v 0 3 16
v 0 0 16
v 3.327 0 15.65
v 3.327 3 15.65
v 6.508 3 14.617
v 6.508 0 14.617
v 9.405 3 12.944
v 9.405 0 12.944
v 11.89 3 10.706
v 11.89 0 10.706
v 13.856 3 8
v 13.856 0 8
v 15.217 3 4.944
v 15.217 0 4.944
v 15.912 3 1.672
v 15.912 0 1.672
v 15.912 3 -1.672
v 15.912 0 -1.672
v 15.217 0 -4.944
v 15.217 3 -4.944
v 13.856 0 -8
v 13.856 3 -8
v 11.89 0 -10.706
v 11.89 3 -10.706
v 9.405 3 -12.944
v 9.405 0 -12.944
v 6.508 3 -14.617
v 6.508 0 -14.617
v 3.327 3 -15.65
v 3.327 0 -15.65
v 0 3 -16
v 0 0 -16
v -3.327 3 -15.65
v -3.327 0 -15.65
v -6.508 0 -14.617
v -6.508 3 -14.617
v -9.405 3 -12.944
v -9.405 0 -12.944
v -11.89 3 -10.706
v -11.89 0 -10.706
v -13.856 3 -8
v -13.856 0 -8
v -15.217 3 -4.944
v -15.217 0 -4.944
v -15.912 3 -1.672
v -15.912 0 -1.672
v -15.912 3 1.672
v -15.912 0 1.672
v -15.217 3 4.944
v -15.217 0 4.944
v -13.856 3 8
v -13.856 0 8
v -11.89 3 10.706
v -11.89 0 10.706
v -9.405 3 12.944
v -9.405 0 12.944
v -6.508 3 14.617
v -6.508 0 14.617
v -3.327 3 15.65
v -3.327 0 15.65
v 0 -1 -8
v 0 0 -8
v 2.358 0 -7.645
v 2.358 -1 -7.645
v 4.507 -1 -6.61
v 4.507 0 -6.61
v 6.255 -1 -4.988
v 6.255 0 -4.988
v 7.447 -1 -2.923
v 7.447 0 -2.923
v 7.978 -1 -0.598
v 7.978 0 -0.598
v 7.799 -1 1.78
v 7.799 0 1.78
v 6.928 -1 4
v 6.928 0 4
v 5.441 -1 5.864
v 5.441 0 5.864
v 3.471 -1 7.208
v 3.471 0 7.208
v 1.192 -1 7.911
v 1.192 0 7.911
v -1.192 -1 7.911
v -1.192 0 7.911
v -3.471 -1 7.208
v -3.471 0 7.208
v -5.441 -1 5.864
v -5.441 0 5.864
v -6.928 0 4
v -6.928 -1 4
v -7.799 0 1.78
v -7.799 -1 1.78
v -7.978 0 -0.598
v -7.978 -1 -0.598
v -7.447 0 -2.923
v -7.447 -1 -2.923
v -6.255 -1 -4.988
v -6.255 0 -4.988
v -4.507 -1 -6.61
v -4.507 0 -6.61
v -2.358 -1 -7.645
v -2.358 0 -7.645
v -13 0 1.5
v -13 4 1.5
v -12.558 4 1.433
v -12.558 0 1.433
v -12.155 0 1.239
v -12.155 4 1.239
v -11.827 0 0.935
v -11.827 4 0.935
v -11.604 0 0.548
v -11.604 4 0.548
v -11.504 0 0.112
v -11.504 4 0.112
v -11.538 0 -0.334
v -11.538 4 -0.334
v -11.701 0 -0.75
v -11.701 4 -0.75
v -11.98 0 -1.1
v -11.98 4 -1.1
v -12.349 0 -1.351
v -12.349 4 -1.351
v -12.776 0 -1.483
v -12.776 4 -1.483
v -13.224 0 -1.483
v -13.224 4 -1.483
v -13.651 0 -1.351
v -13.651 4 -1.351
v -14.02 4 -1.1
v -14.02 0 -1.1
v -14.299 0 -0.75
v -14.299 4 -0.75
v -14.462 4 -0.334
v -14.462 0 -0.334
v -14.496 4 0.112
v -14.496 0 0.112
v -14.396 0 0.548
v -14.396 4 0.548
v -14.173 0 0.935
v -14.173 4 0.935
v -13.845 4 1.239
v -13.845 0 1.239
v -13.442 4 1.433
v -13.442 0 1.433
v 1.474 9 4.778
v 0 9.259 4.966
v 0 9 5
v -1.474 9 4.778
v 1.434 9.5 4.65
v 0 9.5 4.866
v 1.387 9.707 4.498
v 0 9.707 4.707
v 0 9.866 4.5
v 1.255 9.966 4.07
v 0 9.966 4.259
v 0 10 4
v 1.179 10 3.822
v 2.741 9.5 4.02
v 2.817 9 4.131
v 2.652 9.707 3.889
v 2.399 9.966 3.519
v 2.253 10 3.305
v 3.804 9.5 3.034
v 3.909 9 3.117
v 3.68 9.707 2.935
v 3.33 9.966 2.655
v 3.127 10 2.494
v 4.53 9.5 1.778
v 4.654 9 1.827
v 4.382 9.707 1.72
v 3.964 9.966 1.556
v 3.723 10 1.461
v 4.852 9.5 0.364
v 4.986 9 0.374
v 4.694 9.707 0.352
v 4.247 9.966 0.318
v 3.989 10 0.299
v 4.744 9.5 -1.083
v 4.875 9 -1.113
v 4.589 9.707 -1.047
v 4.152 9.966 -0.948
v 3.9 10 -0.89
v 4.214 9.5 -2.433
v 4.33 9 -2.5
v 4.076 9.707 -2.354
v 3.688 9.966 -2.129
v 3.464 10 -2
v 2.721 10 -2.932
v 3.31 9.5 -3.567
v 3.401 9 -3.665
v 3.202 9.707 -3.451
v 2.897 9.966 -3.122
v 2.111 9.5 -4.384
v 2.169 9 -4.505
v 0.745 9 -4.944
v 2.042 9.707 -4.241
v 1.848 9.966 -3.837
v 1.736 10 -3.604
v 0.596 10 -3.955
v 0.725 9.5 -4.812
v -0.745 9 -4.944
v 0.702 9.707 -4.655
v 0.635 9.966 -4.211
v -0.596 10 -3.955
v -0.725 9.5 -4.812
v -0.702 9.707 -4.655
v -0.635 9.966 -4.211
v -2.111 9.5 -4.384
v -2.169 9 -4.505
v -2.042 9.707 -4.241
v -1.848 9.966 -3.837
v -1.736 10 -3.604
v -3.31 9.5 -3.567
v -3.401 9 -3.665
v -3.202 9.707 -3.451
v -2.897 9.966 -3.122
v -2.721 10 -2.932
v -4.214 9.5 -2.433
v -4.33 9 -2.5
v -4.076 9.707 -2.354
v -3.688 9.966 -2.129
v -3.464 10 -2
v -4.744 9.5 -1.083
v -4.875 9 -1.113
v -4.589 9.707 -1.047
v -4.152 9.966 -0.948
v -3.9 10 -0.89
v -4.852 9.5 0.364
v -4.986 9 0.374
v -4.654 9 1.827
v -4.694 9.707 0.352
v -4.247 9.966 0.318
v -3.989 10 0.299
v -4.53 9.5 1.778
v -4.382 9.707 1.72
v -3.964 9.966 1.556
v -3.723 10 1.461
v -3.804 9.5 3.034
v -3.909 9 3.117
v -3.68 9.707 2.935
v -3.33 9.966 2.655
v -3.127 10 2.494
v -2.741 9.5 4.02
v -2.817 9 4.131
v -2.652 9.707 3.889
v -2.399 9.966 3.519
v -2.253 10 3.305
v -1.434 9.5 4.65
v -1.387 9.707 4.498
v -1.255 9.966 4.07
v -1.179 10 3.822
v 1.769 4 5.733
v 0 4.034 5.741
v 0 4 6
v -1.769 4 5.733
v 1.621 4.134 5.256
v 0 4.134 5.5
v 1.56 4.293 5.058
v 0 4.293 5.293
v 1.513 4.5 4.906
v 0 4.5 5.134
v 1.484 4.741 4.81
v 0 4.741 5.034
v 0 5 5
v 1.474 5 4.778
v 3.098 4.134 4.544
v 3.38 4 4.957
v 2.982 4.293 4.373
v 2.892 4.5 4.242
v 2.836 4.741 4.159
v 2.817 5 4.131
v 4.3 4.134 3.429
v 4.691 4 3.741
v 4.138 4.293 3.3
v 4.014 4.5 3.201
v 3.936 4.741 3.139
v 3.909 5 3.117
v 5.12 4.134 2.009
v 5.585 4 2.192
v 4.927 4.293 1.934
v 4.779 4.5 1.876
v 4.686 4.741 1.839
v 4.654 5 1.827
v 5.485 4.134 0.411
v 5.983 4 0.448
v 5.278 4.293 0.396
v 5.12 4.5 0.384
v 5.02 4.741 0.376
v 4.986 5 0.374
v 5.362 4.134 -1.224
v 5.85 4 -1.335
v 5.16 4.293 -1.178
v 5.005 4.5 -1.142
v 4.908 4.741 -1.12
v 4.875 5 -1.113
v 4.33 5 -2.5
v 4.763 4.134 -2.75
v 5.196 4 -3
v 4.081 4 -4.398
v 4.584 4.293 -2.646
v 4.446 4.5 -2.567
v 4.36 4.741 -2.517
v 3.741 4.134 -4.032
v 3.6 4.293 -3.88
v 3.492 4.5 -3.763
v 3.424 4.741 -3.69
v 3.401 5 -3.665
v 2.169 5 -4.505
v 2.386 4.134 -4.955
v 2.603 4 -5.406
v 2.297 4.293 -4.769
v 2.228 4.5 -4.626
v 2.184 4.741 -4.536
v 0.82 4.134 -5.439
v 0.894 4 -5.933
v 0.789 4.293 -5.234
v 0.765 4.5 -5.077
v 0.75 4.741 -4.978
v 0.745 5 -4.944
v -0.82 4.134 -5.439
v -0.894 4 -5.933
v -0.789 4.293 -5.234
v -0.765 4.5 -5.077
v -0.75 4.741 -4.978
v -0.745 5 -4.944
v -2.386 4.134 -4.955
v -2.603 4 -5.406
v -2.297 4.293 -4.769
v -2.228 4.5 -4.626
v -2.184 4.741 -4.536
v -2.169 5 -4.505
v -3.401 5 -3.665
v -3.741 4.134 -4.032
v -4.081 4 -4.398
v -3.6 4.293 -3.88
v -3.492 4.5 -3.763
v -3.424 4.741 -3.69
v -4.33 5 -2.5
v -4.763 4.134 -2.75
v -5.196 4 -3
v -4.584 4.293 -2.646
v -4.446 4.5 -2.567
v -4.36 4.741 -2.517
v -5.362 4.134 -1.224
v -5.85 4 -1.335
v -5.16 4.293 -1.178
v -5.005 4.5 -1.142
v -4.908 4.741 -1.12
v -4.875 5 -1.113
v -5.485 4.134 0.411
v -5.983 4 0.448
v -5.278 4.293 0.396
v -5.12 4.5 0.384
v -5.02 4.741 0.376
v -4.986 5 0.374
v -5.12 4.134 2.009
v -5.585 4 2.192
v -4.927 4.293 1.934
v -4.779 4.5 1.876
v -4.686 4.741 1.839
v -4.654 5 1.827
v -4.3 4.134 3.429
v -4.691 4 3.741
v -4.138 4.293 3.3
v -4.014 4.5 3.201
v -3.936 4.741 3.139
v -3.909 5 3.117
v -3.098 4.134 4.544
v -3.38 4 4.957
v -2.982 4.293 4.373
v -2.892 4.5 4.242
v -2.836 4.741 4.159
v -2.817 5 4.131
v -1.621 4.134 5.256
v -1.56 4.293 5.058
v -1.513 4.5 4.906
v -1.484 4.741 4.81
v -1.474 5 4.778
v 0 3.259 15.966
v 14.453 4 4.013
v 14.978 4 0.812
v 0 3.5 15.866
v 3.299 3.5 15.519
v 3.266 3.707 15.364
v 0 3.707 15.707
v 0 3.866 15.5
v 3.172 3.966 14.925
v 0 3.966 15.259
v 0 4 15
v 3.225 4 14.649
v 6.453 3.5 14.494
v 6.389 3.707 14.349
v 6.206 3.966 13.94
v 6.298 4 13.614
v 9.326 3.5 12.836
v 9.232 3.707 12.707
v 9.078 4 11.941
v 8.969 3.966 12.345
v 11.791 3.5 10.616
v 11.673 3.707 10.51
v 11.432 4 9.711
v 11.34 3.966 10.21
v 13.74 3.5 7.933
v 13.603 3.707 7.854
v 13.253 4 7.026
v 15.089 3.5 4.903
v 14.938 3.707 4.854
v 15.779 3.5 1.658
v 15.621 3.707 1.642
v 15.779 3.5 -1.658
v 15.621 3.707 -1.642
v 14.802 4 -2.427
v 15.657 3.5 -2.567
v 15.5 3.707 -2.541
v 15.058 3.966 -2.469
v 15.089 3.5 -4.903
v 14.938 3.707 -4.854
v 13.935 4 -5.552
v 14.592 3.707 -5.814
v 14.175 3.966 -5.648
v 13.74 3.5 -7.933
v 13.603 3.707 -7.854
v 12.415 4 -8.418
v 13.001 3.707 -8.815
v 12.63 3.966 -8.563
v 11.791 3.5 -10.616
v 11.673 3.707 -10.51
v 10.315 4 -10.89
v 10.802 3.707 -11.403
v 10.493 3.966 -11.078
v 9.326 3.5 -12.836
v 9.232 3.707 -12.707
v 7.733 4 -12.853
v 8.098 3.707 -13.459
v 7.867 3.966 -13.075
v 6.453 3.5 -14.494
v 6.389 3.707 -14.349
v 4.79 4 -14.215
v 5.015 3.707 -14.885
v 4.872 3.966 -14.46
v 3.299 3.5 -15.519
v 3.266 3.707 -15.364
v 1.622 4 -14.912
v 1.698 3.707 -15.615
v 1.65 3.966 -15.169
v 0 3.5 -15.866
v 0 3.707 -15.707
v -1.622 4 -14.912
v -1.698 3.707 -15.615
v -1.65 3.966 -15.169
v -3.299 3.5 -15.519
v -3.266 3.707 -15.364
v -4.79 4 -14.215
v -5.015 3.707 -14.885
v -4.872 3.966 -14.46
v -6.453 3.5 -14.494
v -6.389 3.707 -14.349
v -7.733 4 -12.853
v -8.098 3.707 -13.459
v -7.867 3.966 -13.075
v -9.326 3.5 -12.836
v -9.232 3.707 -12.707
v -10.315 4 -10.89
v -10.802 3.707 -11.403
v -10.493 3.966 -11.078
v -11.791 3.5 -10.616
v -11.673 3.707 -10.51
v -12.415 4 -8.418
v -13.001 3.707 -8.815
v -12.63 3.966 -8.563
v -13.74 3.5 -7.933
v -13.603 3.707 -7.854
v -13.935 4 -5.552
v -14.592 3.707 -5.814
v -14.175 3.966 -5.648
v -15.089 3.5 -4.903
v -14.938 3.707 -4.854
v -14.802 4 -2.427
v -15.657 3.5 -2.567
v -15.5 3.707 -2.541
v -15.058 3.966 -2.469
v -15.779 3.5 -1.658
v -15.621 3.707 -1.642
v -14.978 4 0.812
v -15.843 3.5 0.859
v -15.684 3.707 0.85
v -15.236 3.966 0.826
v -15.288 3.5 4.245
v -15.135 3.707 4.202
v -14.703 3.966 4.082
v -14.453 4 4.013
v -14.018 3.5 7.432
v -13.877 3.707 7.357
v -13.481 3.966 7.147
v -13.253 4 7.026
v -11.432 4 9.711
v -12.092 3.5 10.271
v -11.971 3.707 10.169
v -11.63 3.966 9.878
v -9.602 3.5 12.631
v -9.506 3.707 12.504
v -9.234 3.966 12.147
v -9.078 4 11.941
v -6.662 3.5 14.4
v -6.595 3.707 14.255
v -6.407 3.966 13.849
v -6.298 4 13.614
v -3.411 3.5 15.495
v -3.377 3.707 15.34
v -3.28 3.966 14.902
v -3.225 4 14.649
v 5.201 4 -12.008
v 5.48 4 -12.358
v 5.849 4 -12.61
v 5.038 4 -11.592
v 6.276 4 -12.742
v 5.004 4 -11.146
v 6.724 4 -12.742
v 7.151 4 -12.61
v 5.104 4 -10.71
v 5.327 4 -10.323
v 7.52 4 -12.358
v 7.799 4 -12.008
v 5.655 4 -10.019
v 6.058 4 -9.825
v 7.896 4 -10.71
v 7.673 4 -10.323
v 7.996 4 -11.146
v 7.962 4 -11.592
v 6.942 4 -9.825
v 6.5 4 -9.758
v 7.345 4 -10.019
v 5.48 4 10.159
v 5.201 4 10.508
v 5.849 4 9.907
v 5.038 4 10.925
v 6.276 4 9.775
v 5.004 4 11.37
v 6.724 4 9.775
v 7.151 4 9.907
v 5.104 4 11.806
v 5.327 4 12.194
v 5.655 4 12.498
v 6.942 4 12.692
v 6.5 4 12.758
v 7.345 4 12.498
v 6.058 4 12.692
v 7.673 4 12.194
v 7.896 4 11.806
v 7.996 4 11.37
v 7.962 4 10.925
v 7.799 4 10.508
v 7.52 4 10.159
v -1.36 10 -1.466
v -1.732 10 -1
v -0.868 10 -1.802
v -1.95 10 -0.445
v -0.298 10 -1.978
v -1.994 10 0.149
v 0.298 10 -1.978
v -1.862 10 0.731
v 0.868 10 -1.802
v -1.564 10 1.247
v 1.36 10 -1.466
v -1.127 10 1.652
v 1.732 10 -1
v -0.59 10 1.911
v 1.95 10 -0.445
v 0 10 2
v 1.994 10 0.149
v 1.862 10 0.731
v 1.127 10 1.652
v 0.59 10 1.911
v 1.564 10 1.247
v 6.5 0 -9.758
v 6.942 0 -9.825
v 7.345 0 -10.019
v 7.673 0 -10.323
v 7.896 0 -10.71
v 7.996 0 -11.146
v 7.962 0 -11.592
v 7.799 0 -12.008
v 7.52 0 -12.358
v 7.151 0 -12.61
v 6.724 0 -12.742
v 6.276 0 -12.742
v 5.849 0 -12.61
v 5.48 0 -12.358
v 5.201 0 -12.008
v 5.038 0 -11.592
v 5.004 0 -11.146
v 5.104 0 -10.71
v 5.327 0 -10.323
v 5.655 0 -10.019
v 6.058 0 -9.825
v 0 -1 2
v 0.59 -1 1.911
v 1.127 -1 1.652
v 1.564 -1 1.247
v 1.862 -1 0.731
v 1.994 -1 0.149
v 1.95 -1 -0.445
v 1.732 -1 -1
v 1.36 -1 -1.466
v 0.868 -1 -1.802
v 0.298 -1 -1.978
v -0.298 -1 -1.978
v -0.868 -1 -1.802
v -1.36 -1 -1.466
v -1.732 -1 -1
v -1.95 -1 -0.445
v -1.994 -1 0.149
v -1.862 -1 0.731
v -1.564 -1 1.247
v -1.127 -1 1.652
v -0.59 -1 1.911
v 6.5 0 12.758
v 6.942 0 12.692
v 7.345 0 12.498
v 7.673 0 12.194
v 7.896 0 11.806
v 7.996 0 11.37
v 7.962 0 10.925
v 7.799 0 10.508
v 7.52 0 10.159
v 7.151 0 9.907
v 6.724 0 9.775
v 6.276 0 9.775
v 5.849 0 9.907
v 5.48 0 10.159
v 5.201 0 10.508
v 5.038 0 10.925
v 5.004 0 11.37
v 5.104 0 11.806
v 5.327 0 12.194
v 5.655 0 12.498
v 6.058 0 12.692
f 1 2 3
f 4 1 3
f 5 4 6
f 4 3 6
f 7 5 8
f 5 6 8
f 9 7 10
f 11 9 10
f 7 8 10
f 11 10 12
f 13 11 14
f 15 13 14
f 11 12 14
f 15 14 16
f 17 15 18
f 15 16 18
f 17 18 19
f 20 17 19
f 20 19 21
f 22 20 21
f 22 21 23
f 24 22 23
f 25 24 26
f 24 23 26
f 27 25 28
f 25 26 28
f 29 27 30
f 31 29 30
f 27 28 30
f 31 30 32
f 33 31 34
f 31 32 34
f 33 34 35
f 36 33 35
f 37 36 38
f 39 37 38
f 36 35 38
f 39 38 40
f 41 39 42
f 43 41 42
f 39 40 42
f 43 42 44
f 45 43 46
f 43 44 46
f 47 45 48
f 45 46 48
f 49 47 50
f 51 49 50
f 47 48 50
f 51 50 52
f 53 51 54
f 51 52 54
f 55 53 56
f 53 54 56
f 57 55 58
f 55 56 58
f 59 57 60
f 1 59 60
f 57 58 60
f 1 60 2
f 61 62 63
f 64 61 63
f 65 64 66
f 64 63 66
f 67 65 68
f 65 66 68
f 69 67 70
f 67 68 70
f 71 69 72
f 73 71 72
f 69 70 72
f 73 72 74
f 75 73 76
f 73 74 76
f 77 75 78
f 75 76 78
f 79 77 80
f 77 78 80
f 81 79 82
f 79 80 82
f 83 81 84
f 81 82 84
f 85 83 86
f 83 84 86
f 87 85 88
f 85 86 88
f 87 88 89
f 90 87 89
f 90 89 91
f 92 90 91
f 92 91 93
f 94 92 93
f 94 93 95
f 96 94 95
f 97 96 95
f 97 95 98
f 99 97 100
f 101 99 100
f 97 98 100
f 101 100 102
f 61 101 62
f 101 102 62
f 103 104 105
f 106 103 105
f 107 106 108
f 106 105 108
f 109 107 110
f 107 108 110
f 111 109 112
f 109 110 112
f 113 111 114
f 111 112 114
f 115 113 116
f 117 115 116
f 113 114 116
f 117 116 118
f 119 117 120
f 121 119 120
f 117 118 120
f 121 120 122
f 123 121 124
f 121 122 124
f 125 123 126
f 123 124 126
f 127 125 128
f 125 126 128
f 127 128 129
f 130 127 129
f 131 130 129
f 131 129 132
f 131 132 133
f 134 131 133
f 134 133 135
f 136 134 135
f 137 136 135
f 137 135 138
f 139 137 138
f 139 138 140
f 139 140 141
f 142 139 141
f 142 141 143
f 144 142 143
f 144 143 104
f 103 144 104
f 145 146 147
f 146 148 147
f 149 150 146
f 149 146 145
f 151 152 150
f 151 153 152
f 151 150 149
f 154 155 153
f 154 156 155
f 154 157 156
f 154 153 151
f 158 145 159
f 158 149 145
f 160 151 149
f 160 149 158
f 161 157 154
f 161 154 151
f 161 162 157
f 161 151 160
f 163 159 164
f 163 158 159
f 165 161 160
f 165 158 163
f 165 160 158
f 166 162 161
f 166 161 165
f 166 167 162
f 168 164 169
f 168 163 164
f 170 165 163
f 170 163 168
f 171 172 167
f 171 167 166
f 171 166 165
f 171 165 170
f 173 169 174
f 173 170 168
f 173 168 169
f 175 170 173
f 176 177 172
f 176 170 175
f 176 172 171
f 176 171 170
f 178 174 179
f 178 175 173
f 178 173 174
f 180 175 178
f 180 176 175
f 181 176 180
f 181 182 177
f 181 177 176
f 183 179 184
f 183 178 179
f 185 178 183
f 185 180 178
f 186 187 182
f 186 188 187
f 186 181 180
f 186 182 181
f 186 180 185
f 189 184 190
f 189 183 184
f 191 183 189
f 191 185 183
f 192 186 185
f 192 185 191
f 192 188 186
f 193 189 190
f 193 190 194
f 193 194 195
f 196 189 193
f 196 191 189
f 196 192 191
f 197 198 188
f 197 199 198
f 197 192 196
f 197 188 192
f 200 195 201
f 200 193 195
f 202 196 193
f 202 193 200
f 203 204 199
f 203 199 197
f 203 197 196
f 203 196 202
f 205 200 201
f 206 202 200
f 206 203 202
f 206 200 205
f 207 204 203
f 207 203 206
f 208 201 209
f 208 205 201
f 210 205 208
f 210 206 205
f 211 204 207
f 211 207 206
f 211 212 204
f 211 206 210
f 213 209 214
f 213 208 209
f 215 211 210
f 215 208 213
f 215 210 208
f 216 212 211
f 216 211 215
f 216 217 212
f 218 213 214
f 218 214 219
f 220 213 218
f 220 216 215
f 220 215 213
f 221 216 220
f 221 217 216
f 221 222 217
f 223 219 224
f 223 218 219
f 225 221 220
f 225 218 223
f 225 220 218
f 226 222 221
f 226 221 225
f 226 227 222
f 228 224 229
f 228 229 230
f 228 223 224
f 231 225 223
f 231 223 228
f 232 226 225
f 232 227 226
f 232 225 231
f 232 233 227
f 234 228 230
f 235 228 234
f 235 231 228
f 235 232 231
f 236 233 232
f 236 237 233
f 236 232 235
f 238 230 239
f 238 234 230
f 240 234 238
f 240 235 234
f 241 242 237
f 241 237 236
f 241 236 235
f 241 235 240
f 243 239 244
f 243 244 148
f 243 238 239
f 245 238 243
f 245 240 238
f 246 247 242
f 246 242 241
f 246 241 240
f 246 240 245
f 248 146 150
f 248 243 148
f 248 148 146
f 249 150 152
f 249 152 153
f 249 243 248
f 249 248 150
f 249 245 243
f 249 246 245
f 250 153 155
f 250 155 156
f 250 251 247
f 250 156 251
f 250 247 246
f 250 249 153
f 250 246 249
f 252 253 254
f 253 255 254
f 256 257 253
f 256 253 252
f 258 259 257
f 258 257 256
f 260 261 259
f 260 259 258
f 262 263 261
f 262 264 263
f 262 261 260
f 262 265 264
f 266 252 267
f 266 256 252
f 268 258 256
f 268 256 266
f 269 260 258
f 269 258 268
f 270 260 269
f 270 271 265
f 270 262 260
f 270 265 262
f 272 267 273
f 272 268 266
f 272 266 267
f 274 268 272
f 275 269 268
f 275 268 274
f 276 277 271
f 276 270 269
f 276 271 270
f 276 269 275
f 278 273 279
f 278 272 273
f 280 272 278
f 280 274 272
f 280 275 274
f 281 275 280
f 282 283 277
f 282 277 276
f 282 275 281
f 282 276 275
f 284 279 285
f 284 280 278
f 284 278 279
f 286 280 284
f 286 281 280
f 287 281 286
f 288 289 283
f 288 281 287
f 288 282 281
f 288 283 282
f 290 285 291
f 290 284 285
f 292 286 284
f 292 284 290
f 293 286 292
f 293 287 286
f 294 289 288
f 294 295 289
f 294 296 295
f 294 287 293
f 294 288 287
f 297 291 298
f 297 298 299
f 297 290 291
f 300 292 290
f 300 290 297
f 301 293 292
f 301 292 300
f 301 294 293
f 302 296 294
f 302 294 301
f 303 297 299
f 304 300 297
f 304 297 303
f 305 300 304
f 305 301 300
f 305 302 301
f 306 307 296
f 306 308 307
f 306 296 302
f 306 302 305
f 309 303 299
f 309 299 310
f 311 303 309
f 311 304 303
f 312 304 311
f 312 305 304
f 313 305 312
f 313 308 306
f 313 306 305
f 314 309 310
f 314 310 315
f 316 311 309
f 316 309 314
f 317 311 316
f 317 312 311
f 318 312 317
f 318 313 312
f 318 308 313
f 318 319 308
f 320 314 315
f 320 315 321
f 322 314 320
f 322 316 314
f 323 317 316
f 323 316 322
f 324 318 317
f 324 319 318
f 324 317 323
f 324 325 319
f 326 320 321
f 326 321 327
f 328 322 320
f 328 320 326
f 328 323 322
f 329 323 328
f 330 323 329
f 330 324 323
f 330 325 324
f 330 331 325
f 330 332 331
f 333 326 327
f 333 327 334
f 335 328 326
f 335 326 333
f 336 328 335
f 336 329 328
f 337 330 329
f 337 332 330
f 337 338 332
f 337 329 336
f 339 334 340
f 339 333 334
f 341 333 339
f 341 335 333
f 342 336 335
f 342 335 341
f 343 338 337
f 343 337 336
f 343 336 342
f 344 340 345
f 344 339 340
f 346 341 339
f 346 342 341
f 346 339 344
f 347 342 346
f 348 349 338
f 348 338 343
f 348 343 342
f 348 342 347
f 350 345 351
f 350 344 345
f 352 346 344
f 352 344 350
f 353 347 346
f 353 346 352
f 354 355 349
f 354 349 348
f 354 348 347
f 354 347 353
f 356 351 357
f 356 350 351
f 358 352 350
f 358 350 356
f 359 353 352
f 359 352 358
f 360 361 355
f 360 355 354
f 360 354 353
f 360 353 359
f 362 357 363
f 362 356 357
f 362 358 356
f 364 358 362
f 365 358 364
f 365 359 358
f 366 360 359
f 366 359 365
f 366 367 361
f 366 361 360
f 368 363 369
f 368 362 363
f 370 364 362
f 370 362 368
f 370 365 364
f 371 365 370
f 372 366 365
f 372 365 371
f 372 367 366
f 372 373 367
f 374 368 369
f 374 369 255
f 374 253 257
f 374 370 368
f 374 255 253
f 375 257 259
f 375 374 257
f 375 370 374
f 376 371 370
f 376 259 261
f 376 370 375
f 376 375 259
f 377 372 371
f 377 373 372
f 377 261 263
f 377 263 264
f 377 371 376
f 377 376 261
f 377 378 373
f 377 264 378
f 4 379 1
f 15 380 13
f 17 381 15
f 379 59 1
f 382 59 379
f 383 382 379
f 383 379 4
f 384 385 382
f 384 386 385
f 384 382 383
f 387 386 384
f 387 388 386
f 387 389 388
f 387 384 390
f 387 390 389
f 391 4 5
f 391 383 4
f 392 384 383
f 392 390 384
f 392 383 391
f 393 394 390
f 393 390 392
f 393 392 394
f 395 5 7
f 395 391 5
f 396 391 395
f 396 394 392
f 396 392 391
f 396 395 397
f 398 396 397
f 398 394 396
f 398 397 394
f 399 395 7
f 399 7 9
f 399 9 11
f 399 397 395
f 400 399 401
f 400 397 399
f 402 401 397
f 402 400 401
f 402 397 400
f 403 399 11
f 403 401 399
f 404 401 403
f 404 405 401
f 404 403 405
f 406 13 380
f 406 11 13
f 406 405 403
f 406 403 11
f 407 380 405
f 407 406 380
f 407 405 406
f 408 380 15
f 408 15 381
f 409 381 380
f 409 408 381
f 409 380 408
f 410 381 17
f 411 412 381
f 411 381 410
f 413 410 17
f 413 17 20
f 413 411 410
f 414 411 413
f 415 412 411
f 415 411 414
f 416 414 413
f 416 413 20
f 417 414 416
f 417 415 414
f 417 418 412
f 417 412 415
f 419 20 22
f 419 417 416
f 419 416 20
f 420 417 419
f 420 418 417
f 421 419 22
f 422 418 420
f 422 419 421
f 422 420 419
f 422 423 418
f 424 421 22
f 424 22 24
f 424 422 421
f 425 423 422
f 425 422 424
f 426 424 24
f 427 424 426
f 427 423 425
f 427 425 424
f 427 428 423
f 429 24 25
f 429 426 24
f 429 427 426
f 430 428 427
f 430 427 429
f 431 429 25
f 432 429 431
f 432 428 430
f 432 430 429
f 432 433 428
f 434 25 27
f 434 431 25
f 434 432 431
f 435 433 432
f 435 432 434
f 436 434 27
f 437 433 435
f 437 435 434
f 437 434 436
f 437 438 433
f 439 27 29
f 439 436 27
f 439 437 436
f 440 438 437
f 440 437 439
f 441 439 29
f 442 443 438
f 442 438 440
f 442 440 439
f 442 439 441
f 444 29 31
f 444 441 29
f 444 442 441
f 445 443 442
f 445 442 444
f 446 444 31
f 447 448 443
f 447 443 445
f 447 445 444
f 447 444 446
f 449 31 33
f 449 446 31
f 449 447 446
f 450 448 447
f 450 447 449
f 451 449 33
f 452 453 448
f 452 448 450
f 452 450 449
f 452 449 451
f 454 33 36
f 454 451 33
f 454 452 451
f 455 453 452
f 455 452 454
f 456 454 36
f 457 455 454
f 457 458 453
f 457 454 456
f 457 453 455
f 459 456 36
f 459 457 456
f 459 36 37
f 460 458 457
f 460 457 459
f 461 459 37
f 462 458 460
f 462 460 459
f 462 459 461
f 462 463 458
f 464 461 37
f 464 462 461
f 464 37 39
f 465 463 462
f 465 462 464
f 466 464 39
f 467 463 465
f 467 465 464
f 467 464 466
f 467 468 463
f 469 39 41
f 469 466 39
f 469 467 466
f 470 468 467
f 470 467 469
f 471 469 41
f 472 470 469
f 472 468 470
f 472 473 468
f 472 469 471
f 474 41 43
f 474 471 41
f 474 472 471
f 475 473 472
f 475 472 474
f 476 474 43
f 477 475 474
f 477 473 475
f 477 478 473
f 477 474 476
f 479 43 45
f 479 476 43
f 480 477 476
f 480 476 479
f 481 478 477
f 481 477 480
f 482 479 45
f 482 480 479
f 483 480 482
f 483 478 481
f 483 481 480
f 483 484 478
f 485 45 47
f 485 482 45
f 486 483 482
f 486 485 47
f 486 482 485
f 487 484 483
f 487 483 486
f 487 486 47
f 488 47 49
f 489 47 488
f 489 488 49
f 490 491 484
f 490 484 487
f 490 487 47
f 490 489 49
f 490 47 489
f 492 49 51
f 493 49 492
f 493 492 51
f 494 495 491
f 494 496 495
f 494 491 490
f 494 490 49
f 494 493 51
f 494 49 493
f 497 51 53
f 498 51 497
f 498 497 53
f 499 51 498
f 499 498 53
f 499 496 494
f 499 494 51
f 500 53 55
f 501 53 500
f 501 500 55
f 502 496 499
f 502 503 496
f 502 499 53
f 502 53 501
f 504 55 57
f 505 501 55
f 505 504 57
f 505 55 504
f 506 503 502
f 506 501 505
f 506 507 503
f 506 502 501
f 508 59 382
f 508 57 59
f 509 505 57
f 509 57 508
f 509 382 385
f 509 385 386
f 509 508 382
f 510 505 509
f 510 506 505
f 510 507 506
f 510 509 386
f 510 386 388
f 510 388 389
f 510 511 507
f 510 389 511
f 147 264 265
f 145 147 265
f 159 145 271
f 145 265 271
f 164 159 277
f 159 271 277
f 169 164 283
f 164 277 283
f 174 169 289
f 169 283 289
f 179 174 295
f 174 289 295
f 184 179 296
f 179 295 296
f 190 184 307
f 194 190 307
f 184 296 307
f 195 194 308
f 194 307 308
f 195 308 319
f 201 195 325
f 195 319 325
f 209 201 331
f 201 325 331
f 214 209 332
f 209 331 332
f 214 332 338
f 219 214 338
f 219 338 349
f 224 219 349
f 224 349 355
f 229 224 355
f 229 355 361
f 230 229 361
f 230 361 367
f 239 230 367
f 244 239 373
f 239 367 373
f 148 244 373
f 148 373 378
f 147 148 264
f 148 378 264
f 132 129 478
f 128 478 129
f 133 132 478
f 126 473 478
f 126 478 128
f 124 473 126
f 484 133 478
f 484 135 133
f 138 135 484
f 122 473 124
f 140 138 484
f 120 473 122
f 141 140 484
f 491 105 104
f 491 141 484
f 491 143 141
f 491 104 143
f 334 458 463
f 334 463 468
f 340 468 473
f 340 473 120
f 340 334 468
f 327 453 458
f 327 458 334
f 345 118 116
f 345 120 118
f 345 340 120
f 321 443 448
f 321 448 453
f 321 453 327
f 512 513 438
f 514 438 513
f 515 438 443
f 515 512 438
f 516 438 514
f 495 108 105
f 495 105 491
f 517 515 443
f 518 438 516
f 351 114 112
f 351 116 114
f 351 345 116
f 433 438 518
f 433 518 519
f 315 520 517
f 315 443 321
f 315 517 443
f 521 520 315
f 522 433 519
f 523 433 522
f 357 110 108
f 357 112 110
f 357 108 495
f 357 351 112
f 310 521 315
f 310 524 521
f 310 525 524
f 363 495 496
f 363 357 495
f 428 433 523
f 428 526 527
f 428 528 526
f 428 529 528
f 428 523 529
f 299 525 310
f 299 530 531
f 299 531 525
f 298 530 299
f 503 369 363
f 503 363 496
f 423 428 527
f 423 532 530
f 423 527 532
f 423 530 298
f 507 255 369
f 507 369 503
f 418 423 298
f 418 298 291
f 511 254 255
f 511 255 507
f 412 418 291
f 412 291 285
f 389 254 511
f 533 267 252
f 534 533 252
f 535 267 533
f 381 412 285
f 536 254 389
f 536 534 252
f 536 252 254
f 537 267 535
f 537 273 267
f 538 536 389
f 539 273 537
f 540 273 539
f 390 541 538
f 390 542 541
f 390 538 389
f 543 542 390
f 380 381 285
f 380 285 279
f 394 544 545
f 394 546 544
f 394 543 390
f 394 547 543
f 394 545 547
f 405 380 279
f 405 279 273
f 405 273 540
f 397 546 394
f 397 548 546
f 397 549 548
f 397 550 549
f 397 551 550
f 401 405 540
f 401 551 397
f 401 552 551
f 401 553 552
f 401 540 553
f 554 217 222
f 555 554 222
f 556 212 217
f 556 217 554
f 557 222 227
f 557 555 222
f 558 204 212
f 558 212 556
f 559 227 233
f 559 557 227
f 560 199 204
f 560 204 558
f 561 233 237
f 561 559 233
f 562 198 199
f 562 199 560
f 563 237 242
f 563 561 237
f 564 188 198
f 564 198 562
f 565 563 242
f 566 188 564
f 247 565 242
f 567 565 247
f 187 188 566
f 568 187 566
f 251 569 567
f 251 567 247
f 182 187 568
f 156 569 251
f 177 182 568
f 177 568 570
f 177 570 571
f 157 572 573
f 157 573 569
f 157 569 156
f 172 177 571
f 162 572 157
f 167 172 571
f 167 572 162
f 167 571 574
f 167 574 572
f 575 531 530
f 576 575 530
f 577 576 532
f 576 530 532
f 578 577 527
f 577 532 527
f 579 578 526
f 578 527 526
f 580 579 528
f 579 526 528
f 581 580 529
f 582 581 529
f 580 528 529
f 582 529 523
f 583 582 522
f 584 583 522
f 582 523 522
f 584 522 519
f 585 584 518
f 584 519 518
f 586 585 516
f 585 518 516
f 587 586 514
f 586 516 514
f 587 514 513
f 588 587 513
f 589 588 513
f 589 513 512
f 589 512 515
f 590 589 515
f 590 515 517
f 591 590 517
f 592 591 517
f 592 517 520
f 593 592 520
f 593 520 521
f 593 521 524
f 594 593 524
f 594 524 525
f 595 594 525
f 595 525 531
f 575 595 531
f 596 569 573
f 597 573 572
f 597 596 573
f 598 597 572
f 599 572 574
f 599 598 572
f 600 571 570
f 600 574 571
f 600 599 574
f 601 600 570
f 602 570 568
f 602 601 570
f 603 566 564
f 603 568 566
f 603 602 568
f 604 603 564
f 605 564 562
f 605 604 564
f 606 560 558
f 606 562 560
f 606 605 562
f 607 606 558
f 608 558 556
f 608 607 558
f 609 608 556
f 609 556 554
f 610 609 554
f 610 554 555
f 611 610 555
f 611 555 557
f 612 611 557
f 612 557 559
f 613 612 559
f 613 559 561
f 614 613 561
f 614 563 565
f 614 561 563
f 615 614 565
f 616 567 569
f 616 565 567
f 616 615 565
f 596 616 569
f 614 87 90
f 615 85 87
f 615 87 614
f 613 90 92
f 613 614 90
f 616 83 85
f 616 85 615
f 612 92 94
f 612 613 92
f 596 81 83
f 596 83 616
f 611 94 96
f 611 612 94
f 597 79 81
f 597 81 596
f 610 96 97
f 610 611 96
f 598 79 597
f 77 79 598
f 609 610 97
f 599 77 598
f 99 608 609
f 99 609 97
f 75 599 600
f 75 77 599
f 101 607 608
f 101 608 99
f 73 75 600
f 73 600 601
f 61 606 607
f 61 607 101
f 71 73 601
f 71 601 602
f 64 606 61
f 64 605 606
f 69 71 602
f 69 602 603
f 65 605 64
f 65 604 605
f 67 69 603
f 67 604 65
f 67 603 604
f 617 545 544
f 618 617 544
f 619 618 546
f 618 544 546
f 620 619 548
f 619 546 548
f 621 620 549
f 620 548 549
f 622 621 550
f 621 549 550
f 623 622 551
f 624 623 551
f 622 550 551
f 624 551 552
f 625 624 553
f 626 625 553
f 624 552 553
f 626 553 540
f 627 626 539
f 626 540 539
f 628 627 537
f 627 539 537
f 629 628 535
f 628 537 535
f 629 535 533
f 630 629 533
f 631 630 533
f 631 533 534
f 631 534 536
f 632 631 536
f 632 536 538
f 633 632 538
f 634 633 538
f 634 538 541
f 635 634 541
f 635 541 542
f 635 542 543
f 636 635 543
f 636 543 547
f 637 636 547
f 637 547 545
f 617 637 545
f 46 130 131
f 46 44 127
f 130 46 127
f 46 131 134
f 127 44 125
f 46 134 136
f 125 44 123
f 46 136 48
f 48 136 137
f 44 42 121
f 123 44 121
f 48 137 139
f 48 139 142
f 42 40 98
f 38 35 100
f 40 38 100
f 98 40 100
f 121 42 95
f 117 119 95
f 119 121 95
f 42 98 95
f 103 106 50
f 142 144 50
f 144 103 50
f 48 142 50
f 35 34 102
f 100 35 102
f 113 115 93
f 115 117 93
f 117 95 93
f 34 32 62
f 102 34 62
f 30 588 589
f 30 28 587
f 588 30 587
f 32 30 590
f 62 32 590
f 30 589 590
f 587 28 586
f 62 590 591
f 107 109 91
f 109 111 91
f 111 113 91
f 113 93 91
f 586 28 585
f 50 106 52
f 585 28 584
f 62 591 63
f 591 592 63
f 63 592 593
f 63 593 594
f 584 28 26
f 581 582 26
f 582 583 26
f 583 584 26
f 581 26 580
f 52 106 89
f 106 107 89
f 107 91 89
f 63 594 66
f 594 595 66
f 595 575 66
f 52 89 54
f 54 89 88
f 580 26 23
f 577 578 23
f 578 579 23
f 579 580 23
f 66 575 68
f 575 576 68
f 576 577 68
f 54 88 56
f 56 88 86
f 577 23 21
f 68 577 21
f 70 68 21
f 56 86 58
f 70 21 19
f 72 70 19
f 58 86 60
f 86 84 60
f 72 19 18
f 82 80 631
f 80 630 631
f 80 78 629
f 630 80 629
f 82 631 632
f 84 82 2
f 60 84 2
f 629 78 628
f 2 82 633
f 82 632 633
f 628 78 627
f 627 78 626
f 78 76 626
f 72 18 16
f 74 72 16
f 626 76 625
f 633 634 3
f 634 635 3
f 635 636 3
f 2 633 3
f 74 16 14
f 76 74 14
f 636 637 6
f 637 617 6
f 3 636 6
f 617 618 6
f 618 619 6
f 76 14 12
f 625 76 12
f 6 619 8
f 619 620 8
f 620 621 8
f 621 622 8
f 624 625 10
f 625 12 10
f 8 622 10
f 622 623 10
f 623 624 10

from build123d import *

# Parameters (mm, degrees)
SKETCH1_R               = 16
BOSS_EXTRUDE1_DEPTH     = 4
SKETCH2_R               = 5
BOSS_EXTRUDE2_DEPTH     = 6
CUT_EXTRUDE1_REACH      = 25.409
SKETCH3_R               = 1.5
SKETCH4_R               = 8
BOSS_EXTRUDE3_DEPTH     = 1
FILLET1_R               = 1
CUT_EXTRUDE2_DEPTH      = 26.159491314
CUT_EXTRUDE2_DEPTH_BACK = 26.159491314
SKETCH5_R               = 2


with BuildPart() as part:
    # Sketch1 → Boss-Extrude1 (new body)
    with BuildSketch(Plane(origin=(0, 0, 0), x_dir=(1, 0, 0), z_dir=(0, 1, 0))):
        with Locations(Location((0, 0, 0), (0, 0, 270))):
            Circle(SKETCH1_R)
    extrude(amount=BOSS_EXTRUDE1_DEPTH)

    # Sketch2 → Boss-Extrude2 (add)
    with BuildSketch(Plane(origin=(0, 4, 0), x_dir=(1, 0, 0), z_dir=(0, 1, 0))):
        with Locations(Location((0, 0, 0), (0, 0, 270))):
            Circle(SKETCH2_R)
    extrude(amount=BOSS_EXTRUDE2_DEPTH)

    # Sketch3 → Cut-Extrude1 (cut, up to next)
    with BuildSketch(Plane(origin=(0, 4, 0), x_dir=(1, 0, 0), z_dir=(0, 1, 0)), mode=Mode.PRIVATE) as cut_extrude1_sk1:
        with Locations(Location((-13, 0, 0), (0, 0, 270))):
            Circle(SKETCH3_R)
    cut_extrude1_tool1 = extrude(cut_extrude1_sk1.sketch, amount=-CUT_EXTRUDE1_REACH, mode=Mode.PRIVATE) & part.part
    # Sketch3 → Cut-Extrude1 (cut, up to next)
    with BuildSketch(Plane(origin=(0, 4, 0), x_dir=(1, 0, 0), z_dir=(0, 1, 0)), mode=Mode.PRIVATE) as cut_extrude1_sk2:
        with Locations(Location((6.5, 11.258330249, 0), (0, 0, 270))):
            Circle(SKETCH3_R)
    cut_extrude1_tool2 = extrude(cut_extrude1_sk2.sketch, amount=-CUT_EXTRUDE1_REACH, mode=Mode.PRIVATE) & part.part
    # Sketch3 → Cut-Extrude1 (cut, up to next)
    with BuildSketch(Plane(origin=(0, 4, 0), x_dir=(1, 0, 0), z_dir=(0, 1, 0)), mode=Mode.PRIVATE) as cut_extrude1_sk3:
        with Locations(Location((6.5, -11.258330249, 0), (0, 0, 270))):
            Circle(SKETCH3_R)
    cut_extrude1_tool3 = extrude(cut_extrude1_sk3.sketch, amount=-CUT_EXTRUDE1_REACH, mode=Mode.PRIVATE) & part.part
    add(cut_extrude1_tool1.solids().sort_by_distance((-13, 4, 0))[0], mode=Mode.SUBTRACT)
    add(cut_extrude1_tool2.solids().sort_by_distance((6.5, 4, -11.25833))[0], mode=Mode.SUBTRACT)
    add(cut_extrude1_tool3.solids().sort_by_distance((6.5, 4, 11.25833))[0], mode=Mode.SUBTRACT)

    # Sketch4 → Boss-Extrude3 (add)
    with BuildSketch(Plane.XZ):
        with Locations(Location((0, 0, 0), (0, 0, 270))):
            Circle(SKETCH4_R)
    extrude(amount=BOSS_EXTRUDE3_DEPTH)

    # Fillet1
    fillet1_edges = [part.edges().sort_by_distance(p)[0] for p in [
        (0, 4, -16),
        (0, 4, -5),
        (0, 10, -5),
    ]]
    fillet(fillet1_edges, radius=FILLET1_R)

    # Sketch5 → Cut-Extrude2 (cut, two sides: drawn at the far end of the back side and taken through both)
    with BuildSketch(Plane(origin=(0, 10, 0), x_dir=(1, 0, 0), z_dir=(0, 1, 0)).offset(-CUT_EXTRUDE2_DEPTH_BACK)):
        with Locations(Location((0, 0, 0), (0, 0, 270))):
            Circle(SKETCH5_R)
    extrude(amount=CUT_EXTRUDE2_DEPTH + CUT_EXTRUDE2_DEPTH_BACK, mode=Mode.SUBTRACT)


solid = part.part
